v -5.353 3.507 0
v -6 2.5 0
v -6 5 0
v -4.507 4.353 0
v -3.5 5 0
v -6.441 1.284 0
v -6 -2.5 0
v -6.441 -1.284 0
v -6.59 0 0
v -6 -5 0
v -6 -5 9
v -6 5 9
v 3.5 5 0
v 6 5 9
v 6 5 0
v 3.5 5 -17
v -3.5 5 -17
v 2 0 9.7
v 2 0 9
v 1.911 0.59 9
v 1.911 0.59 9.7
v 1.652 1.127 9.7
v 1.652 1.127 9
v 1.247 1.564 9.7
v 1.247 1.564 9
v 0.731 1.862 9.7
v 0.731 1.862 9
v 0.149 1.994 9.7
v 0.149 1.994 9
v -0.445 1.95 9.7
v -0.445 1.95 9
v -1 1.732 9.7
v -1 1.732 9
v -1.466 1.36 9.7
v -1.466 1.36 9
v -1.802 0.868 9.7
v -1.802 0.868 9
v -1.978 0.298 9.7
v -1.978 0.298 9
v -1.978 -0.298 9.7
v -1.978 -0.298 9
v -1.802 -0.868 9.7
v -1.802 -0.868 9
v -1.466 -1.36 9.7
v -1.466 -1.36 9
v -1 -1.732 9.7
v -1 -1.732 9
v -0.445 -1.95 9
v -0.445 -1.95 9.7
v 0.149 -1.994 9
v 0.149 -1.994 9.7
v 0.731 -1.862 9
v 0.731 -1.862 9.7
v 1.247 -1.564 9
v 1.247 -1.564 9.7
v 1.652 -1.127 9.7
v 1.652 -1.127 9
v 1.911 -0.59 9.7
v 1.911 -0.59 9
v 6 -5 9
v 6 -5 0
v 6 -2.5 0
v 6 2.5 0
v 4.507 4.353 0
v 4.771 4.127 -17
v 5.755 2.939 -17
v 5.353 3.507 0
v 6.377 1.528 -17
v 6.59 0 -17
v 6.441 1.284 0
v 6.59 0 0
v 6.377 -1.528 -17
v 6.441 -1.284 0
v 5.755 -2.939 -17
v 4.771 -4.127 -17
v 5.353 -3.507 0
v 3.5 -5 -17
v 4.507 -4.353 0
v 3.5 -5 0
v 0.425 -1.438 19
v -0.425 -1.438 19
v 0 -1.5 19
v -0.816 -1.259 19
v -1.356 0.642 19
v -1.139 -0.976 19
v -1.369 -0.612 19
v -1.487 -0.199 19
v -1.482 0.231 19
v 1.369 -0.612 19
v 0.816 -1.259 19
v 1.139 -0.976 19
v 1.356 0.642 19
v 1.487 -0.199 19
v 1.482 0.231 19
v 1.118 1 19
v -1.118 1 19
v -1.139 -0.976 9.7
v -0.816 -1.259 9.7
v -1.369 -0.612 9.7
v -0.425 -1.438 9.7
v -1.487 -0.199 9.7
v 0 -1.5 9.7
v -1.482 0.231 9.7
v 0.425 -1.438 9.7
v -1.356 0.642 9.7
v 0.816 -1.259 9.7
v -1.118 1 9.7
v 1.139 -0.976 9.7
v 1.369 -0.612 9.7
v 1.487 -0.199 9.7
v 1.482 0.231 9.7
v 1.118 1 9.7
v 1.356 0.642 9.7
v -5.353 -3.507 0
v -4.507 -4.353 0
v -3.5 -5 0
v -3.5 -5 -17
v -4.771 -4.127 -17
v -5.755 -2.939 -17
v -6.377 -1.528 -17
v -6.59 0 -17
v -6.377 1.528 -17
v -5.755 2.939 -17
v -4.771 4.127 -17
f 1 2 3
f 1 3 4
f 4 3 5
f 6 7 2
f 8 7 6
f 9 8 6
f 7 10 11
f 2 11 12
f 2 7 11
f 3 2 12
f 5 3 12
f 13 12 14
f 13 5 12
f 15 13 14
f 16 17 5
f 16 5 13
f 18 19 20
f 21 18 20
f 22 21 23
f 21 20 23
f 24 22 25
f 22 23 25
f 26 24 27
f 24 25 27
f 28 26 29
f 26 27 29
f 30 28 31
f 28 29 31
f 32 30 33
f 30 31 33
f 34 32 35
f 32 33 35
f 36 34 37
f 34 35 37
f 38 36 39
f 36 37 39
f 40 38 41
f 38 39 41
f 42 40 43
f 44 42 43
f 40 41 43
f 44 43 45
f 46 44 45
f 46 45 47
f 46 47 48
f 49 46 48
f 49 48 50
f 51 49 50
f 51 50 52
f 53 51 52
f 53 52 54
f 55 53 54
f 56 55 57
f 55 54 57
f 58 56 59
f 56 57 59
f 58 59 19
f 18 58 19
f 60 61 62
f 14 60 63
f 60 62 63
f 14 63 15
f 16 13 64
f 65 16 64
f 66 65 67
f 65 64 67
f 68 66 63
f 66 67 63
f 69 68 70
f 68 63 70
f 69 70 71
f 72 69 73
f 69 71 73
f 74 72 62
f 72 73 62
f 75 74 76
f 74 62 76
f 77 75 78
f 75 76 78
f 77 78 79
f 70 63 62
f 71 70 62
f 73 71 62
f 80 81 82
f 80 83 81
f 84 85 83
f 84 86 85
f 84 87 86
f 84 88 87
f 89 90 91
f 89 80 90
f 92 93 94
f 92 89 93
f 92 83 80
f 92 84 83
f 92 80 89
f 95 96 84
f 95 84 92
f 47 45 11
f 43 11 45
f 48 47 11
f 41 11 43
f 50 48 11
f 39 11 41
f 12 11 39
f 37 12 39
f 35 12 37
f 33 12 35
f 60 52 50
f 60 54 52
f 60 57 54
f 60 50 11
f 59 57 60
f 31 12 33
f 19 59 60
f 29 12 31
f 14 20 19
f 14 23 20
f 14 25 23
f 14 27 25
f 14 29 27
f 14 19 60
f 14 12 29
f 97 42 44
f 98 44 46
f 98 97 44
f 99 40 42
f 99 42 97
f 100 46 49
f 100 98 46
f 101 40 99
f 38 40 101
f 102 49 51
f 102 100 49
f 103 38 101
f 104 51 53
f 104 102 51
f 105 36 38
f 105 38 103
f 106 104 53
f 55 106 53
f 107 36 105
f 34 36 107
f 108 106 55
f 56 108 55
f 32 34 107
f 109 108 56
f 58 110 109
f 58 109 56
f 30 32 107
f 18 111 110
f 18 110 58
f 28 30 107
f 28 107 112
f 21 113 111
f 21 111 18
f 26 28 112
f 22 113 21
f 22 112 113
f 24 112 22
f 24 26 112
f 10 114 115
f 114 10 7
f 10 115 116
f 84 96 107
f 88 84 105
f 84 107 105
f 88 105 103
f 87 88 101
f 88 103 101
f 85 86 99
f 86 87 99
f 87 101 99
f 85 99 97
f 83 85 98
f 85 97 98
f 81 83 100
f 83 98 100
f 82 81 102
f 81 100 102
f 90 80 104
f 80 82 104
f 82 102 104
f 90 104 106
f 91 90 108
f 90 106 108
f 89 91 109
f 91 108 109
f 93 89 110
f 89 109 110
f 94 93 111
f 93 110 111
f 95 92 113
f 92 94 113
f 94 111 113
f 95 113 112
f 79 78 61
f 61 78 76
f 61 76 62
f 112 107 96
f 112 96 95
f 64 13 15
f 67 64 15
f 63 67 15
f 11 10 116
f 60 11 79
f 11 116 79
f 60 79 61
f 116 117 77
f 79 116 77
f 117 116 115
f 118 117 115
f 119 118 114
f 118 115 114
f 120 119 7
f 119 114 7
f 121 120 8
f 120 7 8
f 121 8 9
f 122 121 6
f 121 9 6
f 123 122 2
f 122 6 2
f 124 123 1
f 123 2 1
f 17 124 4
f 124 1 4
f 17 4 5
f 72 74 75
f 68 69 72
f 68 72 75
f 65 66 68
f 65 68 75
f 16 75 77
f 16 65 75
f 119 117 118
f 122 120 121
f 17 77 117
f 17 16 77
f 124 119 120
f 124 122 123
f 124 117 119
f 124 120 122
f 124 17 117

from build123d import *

# Parameters (mm, degrees)
RESSALTO_EXTRUS_O1_DEPTH = 17
ESBO_O2_W                = 12
ESBO_O2_H                = 10
RESSALTO_EXTRUS_O2_DEPTH = 9
ESBO_O3_R                = 2
RESSALTO_EXTRUS_O3_DEPTH = 0.7
ESBO_O4_R                = 1.5
RESSALTO_EXTRUS_O4_DEPTH = 9.3
CORTE_EXTRUS_O1_START    = -9.3
CORTE_EXTRUS_O1_DEPTH    = 9.3


with BuildPart() as part:
    # Esboço1 → Ressalto-extrusão1 (new body)
    with BuildSketch(Plane.XY):
        with BuildLine():
            Line((-3.5, 5), (3.5, 5))
            ThreePointArc((3.5, 5), (6.590169944, 0), (3.5, -5))
            Line((3.5, -5), (-3.5, -5))
            ThreePointArc((-3.5, -5), (-6.590169944, 0), (-3.5, 5))
        make_face()
    extrude(amount=-RESSALTO_EXTRUS_O1_DEPTH)

    # Esboço2 → Ressalto-extrusão2 (add)
    with BuildSketch(Plane.XY):
        Rectangle(ESBO_O2_W, ESBO_O2_H)
    extrude(amount=RESSALTO_EXTRUS_O2_DEPTH)

    # Esboço3 → Ressalto-extrusão3 (add)
    with BuildSketch(Plane.XY.offset(9)):
        Circle(ESBO_O3_R)
    extrude(amount=RESSALTO_EXTRUS_O3_DEPTH)

    # Esboço4 → Ressalto-extrusão4 (add)
    with BuildSketch(Plane.XY.offset(9.7)):
        Circle(ESBO_O4_R)
    extrude(amount=RESSALTO_EXTRUS_O4_DEPTH)

    # Esboço5 → Corte-extrusão1 (cut)
    with BuildSketch(Plane.XY.offset(19).offset(CORTE_EXTRUS_O1_START)):
        with BuildLine():
            Line((-1.118033989, 1), (1.118033989, 1))
            ThreePointArc((1.118033989, 1), (0, 1.5), (-1.118033989, 1))
        make_face()
    extrude(amount=CORTE_EXTRUS_O1_DEPTH, mode=Mode.SUBTRACT)


solid = part.part
